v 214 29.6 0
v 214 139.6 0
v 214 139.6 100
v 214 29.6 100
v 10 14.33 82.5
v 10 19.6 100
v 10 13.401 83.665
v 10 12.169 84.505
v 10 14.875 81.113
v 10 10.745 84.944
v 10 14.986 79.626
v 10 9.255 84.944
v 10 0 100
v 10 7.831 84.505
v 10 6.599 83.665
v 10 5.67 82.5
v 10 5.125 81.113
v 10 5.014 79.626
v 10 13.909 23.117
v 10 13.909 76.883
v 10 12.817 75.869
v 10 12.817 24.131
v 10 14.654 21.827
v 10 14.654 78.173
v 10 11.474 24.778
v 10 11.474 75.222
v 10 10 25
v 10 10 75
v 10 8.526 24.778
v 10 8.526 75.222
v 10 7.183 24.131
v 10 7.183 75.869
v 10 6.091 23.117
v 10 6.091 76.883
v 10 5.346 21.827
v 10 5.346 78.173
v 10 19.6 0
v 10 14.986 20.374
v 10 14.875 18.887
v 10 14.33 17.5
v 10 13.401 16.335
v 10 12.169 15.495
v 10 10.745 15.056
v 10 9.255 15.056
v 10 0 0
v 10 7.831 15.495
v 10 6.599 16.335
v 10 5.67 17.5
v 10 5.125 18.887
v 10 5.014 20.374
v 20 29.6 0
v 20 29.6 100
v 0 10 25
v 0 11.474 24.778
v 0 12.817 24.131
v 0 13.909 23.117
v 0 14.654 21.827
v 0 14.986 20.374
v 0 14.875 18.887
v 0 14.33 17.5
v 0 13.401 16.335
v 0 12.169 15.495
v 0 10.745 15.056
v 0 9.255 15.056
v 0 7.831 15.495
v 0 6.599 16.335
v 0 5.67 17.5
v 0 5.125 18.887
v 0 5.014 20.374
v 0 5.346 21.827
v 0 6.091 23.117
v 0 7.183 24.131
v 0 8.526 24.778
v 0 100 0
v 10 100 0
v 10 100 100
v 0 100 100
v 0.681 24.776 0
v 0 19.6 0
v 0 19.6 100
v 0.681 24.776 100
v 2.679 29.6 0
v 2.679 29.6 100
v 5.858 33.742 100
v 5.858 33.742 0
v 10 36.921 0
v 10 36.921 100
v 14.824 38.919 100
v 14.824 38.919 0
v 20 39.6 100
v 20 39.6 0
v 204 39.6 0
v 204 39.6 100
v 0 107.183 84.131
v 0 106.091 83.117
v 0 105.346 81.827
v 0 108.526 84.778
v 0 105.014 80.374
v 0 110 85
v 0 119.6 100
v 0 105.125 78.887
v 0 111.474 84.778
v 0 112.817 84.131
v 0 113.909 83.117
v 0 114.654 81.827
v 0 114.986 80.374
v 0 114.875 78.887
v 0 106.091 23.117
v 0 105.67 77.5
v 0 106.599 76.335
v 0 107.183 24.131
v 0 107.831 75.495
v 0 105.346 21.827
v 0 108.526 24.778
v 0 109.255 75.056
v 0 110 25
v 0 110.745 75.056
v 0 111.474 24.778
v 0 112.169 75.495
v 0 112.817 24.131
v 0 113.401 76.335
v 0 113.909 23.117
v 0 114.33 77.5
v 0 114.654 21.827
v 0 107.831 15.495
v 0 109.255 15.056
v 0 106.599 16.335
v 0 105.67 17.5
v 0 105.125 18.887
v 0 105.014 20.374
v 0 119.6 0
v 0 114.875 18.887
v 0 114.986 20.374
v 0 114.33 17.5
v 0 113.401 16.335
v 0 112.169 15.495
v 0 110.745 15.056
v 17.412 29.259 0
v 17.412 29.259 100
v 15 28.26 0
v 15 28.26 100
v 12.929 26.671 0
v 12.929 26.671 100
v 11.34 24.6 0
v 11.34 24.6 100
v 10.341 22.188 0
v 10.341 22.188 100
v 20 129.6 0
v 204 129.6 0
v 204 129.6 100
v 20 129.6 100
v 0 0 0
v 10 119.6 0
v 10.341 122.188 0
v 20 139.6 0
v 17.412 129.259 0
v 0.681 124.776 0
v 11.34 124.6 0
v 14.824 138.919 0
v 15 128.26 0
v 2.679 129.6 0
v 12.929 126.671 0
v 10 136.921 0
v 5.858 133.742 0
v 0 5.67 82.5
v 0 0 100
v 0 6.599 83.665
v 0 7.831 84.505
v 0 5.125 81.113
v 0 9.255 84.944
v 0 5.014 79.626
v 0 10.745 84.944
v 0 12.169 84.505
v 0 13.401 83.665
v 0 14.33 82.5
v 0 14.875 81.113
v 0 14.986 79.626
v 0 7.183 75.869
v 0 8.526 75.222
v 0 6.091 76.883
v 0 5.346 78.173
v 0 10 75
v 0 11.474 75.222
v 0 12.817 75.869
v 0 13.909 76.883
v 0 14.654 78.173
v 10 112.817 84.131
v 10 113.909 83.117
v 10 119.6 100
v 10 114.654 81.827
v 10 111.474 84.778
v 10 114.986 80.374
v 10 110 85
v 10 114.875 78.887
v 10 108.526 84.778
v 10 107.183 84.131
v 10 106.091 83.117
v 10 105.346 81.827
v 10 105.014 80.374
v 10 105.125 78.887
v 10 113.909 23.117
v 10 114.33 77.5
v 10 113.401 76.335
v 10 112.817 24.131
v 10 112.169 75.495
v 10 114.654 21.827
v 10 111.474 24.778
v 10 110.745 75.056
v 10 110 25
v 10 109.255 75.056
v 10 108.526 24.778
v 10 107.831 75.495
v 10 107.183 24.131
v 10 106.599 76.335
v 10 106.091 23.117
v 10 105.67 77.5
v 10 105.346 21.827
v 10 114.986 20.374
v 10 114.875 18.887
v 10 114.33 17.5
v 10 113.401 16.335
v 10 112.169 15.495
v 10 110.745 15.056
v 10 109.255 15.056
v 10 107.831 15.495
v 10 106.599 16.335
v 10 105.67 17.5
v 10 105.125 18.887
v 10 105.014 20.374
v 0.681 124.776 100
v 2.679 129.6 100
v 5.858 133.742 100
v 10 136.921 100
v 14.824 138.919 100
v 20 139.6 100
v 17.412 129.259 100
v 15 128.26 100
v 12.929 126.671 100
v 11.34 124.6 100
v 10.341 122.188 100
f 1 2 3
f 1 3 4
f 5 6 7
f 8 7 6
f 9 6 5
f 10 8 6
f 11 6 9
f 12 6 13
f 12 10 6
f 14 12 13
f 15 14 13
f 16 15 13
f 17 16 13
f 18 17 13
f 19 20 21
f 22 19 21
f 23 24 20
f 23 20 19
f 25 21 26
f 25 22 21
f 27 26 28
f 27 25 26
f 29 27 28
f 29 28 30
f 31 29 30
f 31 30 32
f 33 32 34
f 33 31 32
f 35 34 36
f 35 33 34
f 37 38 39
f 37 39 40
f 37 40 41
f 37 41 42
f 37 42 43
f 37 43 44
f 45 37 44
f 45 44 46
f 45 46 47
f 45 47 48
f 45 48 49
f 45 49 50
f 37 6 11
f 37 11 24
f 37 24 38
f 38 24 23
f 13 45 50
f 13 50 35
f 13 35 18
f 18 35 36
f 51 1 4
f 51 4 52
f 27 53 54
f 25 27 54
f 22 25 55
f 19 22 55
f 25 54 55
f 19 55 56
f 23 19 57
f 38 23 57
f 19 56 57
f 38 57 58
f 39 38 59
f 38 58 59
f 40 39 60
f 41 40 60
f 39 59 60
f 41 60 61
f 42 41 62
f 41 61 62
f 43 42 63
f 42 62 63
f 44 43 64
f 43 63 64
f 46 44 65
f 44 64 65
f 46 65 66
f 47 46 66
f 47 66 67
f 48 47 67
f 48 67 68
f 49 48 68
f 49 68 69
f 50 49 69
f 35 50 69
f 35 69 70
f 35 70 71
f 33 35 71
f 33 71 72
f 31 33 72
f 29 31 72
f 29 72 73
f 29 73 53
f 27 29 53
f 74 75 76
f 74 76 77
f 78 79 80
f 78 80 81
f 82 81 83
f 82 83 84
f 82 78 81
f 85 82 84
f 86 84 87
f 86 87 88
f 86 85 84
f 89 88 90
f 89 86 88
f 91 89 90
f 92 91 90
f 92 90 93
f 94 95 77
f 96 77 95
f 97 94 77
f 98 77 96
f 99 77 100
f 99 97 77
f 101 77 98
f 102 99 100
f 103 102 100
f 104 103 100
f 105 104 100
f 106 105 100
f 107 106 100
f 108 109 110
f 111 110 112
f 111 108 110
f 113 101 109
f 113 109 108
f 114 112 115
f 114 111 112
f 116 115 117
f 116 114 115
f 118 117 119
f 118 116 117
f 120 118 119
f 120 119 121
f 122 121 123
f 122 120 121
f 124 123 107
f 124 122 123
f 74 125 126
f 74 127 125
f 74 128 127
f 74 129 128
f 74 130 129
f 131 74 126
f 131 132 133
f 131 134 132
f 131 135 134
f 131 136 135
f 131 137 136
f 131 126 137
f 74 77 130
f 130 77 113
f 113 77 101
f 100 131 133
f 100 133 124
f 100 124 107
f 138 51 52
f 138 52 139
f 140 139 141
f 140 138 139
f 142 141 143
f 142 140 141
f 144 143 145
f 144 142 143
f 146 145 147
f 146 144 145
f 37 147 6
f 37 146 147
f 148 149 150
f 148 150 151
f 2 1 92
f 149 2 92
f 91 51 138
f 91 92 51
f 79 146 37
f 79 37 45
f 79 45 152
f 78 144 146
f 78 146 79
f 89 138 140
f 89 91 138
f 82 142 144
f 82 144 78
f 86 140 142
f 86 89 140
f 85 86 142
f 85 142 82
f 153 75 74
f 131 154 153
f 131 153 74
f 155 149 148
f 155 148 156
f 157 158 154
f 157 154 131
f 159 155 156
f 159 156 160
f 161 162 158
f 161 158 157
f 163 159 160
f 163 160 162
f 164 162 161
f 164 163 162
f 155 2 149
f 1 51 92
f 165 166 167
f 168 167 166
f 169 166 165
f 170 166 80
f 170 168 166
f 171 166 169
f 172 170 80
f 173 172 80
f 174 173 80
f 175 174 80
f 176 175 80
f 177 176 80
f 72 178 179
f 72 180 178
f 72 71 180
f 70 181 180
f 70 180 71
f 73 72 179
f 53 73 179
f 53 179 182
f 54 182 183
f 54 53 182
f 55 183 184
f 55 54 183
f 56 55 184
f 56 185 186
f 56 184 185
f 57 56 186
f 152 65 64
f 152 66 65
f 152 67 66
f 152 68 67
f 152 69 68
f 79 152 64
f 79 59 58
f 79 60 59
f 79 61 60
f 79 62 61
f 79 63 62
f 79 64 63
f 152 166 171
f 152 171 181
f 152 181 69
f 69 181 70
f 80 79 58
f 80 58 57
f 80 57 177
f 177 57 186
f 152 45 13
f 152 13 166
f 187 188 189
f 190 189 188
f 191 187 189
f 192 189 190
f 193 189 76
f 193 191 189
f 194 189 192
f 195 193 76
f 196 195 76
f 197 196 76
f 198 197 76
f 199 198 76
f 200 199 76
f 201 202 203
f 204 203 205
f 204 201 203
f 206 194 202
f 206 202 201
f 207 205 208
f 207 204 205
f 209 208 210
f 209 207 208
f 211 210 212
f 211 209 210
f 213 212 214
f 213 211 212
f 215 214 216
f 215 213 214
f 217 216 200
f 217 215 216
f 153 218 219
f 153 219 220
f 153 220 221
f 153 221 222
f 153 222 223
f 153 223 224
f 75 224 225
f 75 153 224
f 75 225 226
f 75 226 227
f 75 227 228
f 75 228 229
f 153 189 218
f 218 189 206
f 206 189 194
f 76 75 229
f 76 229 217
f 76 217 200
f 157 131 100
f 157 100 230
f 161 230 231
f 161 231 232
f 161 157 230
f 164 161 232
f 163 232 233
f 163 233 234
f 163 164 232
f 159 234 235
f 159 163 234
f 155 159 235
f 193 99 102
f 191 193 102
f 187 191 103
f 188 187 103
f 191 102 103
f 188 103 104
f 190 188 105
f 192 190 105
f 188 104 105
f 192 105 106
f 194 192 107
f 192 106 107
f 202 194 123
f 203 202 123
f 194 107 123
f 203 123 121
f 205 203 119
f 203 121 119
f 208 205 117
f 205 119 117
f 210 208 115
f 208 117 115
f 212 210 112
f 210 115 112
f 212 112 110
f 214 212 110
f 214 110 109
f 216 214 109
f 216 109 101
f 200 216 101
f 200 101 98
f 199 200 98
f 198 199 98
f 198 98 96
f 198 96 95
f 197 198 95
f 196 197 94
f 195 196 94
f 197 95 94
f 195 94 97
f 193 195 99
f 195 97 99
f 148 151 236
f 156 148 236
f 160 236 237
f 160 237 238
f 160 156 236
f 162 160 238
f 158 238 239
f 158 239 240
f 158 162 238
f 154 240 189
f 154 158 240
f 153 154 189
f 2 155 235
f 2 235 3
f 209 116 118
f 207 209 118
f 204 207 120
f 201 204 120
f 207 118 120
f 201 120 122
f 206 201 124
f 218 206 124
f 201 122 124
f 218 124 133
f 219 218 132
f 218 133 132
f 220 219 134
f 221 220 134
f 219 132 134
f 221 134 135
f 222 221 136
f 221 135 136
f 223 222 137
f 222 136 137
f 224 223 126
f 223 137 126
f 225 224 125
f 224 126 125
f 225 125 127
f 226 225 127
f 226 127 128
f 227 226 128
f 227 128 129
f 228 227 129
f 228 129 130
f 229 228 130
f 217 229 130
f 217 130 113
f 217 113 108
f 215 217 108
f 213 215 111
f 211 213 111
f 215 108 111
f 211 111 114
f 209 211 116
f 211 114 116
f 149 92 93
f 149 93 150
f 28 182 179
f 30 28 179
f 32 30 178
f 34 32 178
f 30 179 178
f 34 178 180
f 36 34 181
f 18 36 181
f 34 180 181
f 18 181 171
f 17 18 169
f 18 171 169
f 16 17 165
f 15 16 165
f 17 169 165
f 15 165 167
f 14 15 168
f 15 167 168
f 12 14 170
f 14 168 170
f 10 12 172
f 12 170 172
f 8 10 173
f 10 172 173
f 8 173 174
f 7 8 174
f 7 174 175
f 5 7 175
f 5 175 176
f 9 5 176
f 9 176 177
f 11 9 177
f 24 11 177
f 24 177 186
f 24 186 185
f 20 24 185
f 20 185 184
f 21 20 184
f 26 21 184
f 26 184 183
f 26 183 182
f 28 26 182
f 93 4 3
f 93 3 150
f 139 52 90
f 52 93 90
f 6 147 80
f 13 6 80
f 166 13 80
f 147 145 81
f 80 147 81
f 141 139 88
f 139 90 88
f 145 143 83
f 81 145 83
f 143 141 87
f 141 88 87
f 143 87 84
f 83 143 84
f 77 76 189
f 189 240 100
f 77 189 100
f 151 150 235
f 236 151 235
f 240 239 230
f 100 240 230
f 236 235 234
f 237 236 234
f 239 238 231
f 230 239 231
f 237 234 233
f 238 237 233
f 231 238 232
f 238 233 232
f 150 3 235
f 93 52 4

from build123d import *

# Parameters (mm, degrees)
BOSS_EXTRUDE2_DEPTH = 100
SKETCH2_R           = 5
CUT_EXTRUDE1_DEPTH  = 275.379591078
SKETCH3_R           = 5
CUT_EXTRUDE2_DEPTH  = 10


with BuildPart() as part:
    # Sketch1 → Boss-Extrude2 (new body)
    with BuildSketch(Plane.XY):
        with BuildLine():
            Line((0, 0), (0, 19.6))
            ThreePointArc((0, 19.6), (5.857864376, 33.742135624), (20, 39.6))
            Line((20, 39.6), (204, 39.6))
            Line((204, 39.6), (204, 129.6))
            Line((204, 129.6), (20, 129.6))
            ThreePointArc((20, 129.6), (12.928932188, 126.671067812), (10, 119.6))
            Line((10, 119.6), (10, 100))
            Line((10, 100), (0, 100))
            Line((0, 100), (0, 119.6))
            ThreePointArc((0, 119.6), (5.857864376, 133.742135624), (20, 139.6))
            Line((20, 139.6), (214, 139.6))
            Line((214, 139.6), (214, 29.6))
            Line((214, 29.6), (20, 29.6))
            ThreePointArc((20, 29.6), (12.928932188, 26.671067812), (10, 19.6))
            Line((10, 19.6), (10, 0))
            Line((10, 0), (0, 0))
        make_face()
    extrude(amount=BOSS_EXTRUDE2_DEPTH)

    # Sketch2 → Cut-Extrude1 (cut, through all)
    with BuildSketch(Plane.ZY):
        with Locations((20, 10)):
            Circle(SKETCH2_R)
        with Locations(Location((80, 10, 0), (0, 0, 180))):
            Circle(SKETCH2_R)
    extrude(amount=-CUT_EXTRUDE1_DEPTH, mode=Mode.SUBTRACT)

    # Sketch3 → Cut-Extrude2 (cut)
    with BuildSketch(Plane.ZY):
        with Locations((20, 110)):
            Circle(SKETCH3_R)
        with Locations((80, 110)):
            Circle(SKETCH3_R)
    extrude(amount=-CUT_EXTRUDE2_DEPTH, mode=Mode.SUBTRACT)


solid = part.part
